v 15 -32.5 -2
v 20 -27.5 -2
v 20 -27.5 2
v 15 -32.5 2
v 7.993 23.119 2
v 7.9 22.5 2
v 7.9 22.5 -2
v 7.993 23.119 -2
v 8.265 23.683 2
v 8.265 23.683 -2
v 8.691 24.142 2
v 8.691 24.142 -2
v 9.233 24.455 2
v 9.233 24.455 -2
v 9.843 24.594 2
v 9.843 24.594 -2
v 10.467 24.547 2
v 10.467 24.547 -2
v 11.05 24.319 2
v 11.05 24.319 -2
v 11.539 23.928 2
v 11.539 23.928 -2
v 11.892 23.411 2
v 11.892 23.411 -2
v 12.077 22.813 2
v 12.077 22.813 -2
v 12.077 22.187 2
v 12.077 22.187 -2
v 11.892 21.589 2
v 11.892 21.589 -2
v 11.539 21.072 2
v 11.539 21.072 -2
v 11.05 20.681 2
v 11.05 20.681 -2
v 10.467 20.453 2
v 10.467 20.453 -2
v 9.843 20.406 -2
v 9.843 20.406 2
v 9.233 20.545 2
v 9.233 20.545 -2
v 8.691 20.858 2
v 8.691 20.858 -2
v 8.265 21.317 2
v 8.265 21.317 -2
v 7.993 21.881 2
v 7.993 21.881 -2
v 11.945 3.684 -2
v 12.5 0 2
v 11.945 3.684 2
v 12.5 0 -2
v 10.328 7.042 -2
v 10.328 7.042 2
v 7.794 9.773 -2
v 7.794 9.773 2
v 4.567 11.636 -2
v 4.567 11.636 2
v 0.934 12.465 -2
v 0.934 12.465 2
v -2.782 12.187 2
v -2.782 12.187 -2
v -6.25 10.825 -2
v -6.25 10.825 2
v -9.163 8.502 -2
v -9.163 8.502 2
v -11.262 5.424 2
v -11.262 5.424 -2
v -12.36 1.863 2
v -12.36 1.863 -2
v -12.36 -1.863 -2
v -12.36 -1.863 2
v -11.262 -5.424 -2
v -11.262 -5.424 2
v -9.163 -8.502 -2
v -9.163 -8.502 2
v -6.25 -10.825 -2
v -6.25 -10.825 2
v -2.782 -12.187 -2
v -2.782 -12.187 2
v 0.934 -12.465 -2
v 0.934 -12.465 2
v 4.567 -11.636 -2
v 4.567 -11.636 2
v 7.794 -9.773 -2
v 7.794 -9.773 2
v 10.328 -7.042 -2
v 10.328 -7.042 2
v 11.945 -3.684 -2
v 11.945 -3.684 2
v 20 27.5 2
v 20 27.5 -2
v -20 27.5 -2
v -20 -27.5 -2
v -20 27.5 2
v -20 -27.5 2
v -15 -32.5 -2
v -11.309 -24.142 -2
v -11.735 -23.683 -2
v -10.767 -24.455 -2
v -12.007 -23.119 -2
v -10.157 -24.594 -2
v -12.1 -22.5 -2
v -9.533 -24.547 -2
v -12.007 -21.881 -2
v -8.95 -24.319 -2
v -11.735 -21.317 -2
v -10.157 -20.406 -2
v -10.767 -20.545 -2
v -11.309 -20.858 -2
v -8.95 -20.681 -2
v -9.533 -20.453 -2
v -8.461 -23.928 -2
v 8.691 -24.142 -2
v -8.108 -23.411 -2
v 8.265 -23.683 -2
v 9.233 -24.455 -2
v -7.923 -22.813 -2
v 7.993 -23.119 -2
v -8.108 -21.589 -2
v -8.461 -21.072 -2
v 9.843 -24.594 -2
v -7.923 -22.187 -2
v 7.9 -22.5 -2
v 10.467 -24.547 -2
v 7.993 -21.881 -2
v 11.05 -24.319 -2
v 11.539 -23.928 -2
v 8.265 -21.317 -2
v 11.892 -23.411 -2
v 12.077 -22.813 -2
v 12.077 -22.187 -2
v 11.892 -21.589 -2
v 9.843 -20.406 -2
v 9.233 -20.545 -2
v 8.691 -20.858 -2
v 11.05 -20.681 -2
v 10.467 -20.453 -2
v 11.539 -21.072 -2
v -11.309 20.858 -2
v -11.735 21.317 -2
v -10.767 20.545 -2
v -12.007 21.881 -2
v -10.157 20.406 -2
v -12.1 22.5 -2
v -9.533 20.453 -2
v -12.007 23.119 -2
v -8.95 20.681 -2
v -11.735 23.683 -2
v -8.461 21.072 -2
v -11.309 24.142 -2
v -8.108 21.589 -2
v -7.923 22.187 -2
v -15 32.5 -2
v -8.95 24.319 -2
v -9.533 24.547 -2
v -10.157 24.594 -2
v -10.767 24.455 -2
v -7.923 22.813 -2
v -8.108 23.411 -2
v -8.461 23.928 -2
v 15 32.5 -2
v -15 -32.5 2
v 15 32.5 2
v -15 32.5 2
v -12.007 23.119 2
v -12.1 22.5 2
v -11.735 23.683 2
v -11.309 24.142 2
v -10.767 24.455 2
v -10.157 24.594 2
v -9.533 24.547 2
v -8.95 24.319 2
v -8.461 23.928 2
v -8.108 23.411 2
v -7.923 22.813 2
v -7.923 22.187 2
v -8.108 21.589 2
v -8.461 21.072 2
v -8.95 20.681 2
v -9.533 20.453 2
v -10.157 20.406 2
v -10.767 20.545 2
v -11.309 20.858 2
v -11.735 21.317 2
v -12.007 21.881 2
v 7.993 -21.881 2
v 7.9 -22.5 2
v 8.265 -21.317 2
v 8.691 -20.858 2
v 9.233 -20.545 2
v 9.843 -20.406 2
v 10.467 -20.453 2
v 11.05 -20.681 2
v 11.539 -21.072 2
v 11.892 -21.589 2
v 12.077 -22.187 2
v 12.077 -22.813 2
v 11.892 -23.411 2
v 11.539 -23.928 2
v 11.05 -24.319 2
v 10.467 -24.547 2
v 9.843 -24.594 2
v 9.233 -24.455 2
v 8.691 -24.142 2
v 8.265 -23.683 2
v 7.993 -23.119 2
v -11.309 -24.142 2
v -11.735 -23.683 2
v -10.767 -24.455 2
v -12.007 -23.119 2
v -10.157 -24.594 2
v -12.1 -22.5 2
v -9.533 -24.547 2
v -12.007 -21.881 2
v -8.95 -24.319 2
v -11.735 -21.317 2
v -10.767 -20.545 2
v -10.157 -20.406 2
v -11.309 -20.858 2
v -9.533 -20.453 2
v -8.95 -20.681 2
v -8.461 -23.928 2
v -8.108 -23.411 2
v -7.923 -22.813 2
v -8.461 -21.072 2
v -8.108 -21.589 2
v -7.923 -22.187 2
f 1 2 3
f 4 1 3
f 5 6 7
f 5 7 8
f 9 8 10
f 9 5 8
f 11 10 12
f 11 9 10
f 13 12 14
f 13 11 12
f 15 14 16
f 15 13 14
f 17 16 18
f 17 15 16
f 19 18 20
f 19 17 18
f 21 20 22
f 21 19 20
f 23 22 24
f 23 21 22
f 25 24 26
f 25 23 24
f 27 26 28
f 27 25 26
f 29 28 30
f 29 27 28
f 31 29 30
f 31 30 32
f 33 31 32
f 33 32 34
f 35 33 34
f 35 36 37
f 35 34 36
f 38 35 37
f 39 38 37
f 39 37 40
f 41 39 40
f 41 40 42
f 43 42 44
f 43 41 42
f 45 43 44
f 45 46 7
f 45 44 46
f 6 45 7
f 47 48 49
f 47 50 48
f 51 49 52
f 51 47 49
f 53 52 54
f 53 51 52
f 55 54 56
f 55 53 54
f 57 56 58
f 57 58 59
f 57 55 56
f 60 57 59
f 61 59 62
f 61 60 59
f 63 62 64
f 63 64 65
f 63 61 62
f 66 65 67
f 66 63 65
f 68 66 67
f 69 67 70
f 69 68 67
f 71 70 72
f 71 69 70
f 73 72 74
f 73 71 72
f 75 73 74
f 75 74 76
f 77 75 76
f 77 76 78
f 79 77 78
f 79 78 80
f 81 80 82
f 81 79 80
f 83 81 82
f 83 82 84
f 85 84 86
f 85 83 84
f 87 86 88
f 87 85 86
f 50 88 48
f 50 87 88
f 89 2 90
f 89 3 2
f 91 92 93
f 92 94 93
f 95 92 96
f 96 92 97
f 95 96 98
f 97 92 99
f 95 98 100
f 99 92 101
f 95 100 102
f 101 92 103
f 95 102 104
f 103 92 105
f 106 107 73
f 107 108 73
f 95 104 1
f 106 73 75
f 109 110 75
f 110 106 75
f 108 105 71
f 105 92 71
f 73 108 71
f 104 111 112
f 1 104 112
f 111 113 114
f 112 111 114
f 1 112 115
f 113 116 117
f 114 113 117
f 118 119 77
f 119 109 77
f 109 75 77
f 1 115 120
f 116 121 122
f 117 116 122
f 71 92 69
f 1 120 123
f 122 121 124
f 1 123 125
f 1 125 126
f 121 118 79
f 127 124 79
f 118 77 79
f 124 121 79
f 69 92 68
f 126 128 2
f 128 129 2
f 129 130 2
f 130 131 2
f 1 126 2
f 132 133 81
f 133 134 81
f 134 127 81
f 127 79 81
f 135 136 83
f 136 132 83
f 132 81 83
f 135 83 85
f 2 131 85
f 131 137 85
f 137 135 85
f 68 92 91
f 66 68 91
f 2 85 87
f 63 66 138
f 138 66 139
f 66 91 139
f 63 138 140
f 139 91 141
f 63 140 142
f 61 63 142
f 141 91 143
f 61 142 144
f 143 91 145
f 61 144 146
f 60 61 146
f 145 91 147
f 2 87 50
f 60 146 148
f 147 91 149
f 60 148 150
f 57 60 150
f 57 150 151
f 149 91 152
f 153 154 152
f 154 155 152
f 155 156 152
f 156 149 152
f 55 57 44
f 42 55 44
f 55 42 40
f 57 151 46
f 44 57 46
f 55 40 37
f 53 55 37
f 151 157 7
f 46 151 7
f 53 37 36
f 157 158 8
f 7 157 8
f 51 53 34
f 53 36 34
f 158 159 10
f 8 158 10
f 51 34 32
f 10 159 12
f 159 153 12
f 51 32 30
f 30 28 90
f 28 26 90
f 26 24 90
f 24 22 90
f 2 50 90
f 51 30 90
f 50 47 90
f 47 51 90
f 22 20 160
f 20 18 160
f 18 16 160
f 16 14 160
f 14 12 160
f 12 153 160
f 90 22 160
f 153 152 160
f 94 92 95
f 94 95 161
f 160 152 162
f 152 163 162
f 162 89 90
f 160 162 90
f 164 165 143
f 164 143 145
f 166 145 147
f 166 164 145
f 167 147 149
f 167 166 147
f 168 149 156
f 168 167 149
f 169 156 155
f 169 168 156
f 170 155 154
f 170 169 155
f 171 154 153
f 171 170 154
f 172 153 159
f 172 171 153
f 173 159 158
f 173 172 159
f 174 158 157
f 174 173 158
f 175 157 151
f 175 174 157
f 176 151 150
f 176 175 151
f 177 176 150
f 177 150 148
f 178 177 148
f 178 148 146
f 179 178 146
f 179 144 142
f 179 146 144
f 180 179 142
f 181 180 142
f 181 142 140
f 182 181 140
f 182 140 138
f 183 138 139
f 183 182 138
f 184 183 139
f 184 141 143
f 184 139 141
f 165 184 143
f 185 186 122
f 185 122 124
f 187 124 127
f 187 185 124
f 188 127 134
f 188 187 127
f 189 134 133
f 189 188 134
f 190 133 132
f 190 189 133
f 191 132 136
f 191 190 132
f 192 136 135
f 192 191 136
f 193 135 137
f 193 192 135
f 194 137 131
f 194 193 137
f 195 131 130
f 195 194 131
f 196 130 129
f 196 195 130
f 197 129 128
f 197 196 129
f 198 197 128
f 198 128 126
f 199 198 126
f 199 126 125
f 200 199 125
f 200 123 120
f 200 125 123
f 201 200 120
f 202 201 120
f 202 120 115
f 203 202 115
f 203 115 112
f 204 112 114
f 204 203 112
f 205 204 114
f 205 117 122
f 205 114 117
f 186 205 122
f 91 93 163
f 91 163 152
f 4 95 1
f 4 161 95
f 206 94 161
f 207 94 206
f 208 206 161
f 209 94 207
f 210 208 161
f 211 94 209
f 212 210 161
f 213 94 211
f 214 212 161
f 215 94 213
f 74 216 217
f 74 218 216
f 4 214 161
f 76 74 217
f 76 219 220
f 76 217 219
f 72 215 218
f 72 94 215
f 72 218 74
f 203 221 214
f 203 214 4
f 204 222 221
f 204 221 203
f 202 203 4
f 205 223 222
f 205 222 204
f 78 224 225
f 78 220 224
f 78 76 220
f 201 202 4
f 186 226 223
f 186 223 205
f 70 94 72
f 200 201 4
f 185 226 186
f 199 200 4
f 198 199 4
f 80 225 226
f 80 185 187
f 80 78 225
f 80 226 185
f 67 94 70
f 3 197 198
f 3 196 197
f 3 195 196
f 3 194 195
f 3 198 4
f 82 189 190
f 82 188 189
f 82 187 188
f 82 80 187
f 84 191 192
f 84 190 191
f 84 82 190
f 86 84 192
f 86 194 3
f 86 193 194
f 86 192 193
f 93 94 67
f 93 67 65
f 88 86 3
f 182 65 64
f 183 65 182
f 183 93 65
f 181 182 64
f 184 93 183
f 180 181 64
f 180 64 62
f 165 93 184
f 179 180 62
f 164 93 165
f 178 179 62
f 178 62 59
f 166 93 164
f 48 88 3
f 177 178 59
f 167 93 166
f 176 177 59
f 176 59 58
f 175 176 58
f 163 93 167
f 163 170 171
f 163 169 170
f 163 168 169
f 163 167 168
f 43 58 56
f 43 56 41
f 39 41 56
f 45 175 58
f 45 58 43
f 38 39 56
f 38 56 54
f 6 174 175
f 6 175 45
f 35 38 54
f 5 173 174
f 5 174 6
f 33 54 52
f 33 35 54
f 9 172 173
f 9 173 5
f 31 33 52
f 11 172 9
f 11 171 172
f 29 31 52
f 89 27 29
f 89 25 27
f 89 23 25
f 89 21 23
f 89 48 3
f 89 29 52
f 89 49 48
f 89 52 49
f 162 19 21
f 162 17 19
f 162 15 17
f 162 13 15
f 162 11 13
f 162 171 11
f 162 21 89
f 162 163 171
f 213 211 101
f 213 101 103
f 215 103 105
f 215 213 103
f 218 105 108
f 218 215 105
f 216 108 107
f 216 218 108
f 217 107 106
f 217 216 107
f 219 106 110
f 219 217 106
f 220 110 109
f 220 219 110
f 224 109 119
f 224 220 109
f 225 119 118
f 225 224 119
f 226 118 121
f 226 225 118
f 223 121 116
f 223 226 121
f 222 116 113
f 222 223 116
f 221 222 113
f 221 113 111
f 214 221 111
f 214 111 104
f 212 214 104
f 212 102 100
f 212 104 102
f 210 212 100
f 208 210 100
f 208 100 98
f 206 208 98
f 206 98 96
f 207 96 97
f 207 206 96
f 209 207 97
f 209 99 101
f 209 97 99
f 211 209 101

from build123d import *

# Parameters (mm, degrees)
SKETCH_1_W               = 40
SKETCH_1_H               = 65
SKETCH_1_R               = 12.5
EXTRUDE_1_DEPTH          = 2
CUT_EXTRUDE_1_DEPTH      = 39.369910086
CUT_EXTRUDE_1_DEPTH_BACK = 39.369910086
SKETCH_2_R               = 2.1
CHAMFER_2_SIZE           = 5


with BuildPart() as part:
    # 草图1 → 凸台-拉伸1 (new, symmetric)
    with BuildSketch(Plane.XY):
        Rectangle(SKETCH_1_W, SKETCH_1_H)
        Circle(SKETCH_1_R, mode=Mode.SUBTRACT)
    extrude(amount=EXTRUDE_1_DEPTH, both=True)

    # 草图2 → 切除-拉伸1 (cut, two sides: drawn at the far end of the back side and taken through both)
    with BuildSketch(Plane(origin=(0, 0, -2), x_dir=(-1, 0, 0), z_dir=(0, 0, -1)).offset(-CUT_EXTRUDE_1_DEPTH_BACK)):
        with Locations((-10, 22.5)):
            Circle(SKETCH_2_R)
        with Locations((10, 22.5)):
            Circle(SKETCH_2_R)
        with Locations((10, -22.5)):
            Circle(SKETCH_2_R)
        with Locations((-10, -22.5)):
            Circle(SKETCH_2_R)
    extrude(amount=CUT_EXTRUDE_1_DEPTH + CUT_EXTRUDE_1_DEPTH_BACK, mode=Mode.SUBTRACT)

    # 倒角2
    chamfer_2_edges = [part.edges().sort_by_distance(p)[0] for p in [
        (-20, 32.5, 0),
        (20, 32.5, 0),
        (20, -32.5, 0),
        (-20, -32.5, 0),
    ]]
    chamfer(chamfer_2_edges, length=CHAMFER_2_SIZE)


solid = part.part
